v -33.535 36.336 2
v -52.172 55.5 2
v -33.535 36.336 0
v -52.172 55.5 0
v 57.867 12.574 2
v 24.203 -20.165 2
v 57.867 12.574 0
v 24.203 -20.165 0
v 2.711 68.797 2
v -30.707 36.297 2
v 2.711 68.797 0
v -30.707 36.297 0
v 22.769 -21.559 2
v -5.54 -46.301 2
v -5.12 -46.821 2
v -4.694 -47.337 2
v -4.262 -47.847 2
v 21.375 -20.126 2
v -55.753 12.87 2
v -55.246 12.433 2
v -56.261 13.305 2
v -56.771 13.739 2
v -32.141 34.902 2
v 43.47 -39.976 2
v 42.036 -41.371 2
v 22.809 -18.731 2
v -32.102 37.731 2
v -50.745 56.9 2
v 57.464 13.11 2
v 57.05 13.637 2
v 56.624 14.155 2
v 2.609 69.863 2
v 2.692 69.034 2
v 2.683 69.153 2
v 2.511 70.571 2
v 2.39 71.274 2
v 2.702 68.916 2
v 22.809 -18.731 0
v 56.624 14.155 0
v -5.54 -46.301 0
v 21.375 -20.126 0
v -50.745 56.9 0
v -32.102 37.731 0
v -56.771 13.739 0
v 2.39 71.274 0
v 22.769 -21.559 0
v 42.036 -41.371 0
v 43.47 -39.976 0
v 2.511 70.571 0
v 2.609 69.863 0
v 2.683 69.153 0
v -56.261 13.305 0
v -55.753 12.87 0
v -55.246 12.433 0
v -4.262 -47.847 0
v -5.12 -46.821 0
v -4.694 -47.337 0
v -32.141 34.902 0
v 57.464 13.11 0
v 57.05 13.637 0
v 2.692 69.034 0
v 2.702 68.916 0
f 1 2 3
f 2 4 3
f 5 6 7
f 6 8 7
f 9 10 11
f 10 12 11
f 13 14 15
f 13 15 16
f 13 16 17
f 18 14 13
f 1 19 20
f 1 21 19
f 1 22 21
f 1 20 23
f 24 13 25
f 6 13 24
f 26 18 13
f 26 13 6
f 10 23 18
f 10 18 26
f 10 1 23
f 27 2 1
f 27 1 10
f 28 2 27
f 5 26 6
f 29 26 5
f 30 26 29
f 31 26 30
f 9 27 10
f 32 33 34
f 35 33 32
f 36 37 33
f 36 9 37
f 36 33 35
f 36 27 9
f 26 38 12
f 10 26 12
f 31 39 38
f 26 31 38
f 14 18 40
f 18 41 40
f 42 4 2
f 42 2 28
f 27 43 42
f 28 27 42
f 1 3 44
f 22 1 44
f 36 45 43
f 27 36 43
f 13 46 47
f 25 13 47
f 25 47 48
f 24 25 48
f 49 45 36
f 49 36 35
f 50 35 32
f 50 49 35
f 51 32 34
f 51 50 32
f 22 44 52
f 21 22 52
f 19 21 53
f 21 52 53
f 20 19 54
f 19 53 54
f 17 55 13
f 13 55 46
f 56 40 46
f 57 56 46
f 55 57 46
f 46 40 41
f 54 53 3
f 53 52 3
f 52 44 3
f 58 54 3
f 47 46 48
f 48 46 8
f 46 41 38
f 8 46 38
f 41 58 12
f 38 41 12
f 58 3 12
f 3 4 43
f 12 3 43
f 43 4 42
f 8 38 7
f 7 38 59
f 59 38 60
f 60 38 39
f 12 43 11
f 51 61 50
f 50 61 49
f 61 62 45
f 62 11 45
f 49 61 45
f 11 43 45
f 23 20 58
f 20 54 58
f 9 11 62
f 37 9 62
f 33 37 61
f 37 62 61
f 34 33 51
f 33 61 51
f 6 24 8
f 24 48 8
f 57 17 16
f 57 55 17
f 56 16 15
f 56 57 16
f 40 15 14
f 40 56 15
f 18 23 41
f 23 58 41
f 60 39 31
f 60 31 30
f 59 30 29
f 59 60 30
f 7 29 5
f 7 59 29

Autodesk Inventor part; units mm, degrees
ref_plane "YZ Plane" through (0, 0, 0) normal (1, 0, 0) x (0, 1, 0)
ref_plane "XZ Plane" through (0, 0, 0) normal (0, 1, 0) x (-1, 0, 0)
ref_plane "XY Plane" through (0, 0, 0) normal (0, 0, 1) x (1, 0, 0)
sketch "Sketch1" plane through (0, 0, 0) normal (0, 0, 1) x (1, 0, 0)
  arc A0 (5.5811, -56.8606) -> (20.209, -64.6836) centre (38.8796, -12.1848) ccw
  arc A1 (-7.6539, -43.4667) -> (5.5811, -56.8606) centre (37.8873, -11.7018) ccw
  arc A2 (-7.6539, -43.4667) -> (-31.2183, -12.0793) centre (-386.265, -303.1724) ccw
  arc A3 (-31.2183, -12.0793) -> (-63.3277, 19.0744) centre (-191.6112, -145.2692) ccw
  arc A4 (-67.5206, 26.3221) -> (-63.3277, 19.0744) centre (-54.6162, 28.9507) ccw
  arc A5 (-66.9469, 41.0059) -> (-67.5206, 26.3221) centre (-15.6776, 31.6496) ccw
  line L0 (-66.9469, 41.0059) -> (-26.0985, 81.0785)
  arc A6 (-3.6955, 79.7027) -> (-26.0985, 81.0785) centre (-17.6076, 36.2535) ccw
  arc A7 (1.4491, 74.6716) -> (-3.6955, 79.7027) centre (-6.1453, 72.0517) ccw
  arc A8 (2.6831, 69.1533) -> (1.4491, 74.6716) centre (-18.5892, 67.2935) ccw
  arc A9 (2.6831, 69.1533) -> (3.1898, 63.5624) centre (229.5421, 86.8959) ccw
  arc A10 (3.1898, 63.5624) -> (8.7161, 49.818) centre (30.4167, 66.5265) ccw
  arc A11 (8.7161, 49.818) -> (19.0471, 39.3259) centre (47.1297, 77.3097) ccw
  arc A12 (19.0471, 39.3259) -> (32.6891, 29.8296) centre (104.4845, 147.5139) ccw
  arc A13 (32.6891, 29.8296) -> (50.5655, 19.6706) centre (502.3948, 835.5524) ccw
  arc A14 (57.8671, 12.5741) -> (50.5655, 19.6706) centre (33.0101, -5.6965) ccw
  arc A15 (67.0572, -4.125) -> (57.8671, 12.5741) centre (18.4686, -19.9867) ccw
  arc A16 (68.9532, -23.0115) -> (67.0572, -4.125) centre (24.8632, -17.8992) ccw
  line L1 (-52.1723, 55.4999) -> (42.0363, -41.3708)
  line L2 (43.4701, -39.9764) -> (-50.7446, 56.9005)
  line L3 (42.0363, -41.3708) -> (43.4701, -39.9764)
  line L4 (-4.2615, -47.8472) -> (57.8671, 12.5741)
  line L5 (56.6239, 14.1548) -> (-5.54, -46.3007)
  line L6 (-55.2456, 12.4327) -> (2.7113, 68.7969)
  line L7 (2.3899, 71.2742) -> (-56.7711, 13.739)
  point P0 (0, 0)
  point P1 (-8.2693, 4.2237)
  point P2 (-4.9861, 4.7501)
  point P3 (-66.0155, 22.3561)
  point P4 (24.203, -20.1649)
  point P5 (22.8086, -18.7311)
  point P6 (-30.7071, 36.2969)
  point P7 (-32.1015, 37.7306)
  point P8 (-33.5353, 36.3363)
  point P9 (-32.1409, 34.9025)
  point P10 (21.3749, -20.1255)
  point P11 (22.7692, -21.5593)
  dimension "d243" = 2
  dimension "d244" = 2
  dimension "d245" = 2
extrude "Extrusion11" add sketch "Sketch1" along normal blind 2 contours L5 L1 L4 A1 | L5 L2 L4 L1 | L1 L6 L2 L5 | A3 L7 L1 L6 | L4 L2 L3 L1 | L1 L7 L2 L6 | L5 A14 L4 L2 | L1 L0 L2 L7 | L2 L7 A8 A9 L6
properties part number "print007_Grundform_Guss_innen"
